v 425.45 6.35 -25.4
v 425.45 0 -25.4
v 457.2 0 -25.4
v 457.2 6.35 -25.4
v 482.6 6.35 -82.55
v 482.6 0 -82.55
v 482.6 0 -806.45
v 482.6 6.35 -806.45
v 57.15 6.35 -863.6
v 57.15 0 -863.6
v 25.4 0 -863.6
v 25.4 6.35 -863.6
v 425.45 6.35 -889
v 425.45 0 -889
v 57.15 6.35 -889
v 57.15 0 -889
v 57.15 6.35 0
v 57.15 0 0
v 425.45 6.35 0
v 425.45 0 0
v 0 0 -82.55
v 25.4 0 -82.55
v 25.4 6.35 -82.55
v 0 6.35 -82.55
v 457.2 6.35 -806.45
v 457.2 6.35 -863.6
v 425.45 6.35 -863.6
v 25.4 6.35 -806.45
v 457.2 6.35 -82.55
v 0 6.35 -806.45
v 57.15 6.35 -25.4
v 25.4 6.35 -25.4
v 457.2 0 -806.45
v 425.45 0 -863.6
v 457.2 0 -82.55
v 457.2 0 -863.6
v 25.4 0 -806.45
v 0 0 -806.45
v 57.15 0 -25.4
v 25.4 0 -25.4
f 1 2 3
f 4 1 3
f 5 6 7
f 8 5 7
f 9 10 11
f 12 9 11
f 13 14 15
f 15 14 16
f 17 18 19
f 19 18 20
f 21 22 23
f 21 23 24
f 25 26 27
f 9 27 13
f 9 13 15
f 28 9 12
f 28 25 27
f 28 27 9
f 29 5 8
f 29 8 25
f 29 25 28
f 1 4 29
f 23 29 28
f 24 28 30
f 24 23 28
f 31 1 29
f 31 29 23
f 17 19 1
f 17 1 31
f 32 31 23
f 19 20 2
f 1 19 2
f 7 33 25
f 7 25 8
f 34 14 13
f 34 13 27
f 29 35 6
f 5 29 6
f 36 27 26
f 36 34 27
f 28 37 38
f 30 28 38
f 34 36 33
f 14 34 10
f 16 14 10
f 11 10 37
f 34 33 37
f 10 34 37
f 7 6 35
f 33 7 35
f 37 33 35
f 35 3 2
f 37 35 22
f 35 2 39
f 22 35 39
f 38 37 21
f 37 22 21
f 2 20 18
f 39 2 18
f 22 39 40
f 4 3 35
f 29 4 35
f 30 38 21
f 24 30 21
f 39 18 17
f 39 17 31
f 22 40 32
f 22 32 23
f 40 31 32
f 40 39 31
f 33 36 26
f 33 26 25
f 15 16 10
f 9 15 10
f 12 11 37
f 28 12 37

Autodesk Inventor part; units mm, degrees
ref_plane "YZ Plane" through (0, 0, 0) normal (1, 0, 0) x (0, 1, 0)
ref_plane "XZ Plane" through (0, 0, 0) normal (0, 1, 0) x (-1, 0, 0)
ref_plane "XY Plane" through (0, 0, 0) normal (0, 0, 1) x (1, 0, 0)
sketch "Sketch1" plane through (0, 0, 0) normal (0, 1, 0) x (-1, 0, 0)
  line L0 (0, 0) -> (-482.6, 0)
  line L1 (-482.6, 0) -> (-482.6, -889)
  line L2 (-482.6, -889) -> (0, -889)
  line L3 (0, -889) -> (0, 0)
  line L4 (0, -889) -> (-25.4, -889)
  line L5 (-25.4, -889) -> (-25.4, -806.45)
  line L6 (-25.4, -806.45) -> (0, -806.45)
  line L7 (0, -806.45) -> (0, -889)
  line L8 (-25.4, -889) -> (-57.15, -889)
  line L9 (-57.15, -889) -> (-57.15, -863.6)
  line L10 (-57.15, -863.6) -> (-25.4, -863.6)
  line L11 (-25.4, -863.6) -> (-25.4, -889)
  line L12 (-241.3, -889) -> (-241.3, -324.207) construction
  line L13 (0, -444.5) -> (-482.6, -444.5) construction
  line L14 (-457.2, -889) -> (-457.2, -806.45)
  line L15 (-457.2, -806.45) -> (-482.6, -806.45)
  line L16 (-425.45, -889) -> (-425.45, -863.6)
  line L17 (-425.45, -863.6) -> (-457.2, -863.6)
  line L18 (-25.4, 0) -> (-25.4, -82.55)
  line L19 (-25.4, -82.55) -> (0, -82.55)
  line L20 (-57.15, 0) -> (-57.15, -25.4)
  line L21 (-57.15, -25.4) -> (-25.4, -25.4)
  line L22 (-457.2, -82.55) -> (-482.6, -82.55)
  line L23 (-457.2, 0) -> (-457.2, -82.55)
  line L24 (-425.45, -25.4) -> (-457.2, -25.4)
  line L25 (-425.45, 0) -> (-425.45, -25.4)
  point P0 (-482.6, -82.55)
  point P1 (-482.6, -806.45)
  point P2 (0, -806.45)
  point P3 (0, -82.55)
  point P4 (-457.2, -25.4)
  dimension "d0" = 482.6
  dimension "d1" = 889
  dimension "d2" = 25.4
  dimension "d3" = 82.55
  dimension "d4" = 31.75
  dimension "d5" = 25.4
extrude "Extrusion1" add sketch "Sketch1" along normal blind 6.35 contours L3 L6 L5 L10 L9 L2 L16 L17 L14 L15 L1 L22 L23 L24 L25 L0 L20 L21 L18 L19
properties part number "Robot bottom" material "Polycarbonate, Smoke"
